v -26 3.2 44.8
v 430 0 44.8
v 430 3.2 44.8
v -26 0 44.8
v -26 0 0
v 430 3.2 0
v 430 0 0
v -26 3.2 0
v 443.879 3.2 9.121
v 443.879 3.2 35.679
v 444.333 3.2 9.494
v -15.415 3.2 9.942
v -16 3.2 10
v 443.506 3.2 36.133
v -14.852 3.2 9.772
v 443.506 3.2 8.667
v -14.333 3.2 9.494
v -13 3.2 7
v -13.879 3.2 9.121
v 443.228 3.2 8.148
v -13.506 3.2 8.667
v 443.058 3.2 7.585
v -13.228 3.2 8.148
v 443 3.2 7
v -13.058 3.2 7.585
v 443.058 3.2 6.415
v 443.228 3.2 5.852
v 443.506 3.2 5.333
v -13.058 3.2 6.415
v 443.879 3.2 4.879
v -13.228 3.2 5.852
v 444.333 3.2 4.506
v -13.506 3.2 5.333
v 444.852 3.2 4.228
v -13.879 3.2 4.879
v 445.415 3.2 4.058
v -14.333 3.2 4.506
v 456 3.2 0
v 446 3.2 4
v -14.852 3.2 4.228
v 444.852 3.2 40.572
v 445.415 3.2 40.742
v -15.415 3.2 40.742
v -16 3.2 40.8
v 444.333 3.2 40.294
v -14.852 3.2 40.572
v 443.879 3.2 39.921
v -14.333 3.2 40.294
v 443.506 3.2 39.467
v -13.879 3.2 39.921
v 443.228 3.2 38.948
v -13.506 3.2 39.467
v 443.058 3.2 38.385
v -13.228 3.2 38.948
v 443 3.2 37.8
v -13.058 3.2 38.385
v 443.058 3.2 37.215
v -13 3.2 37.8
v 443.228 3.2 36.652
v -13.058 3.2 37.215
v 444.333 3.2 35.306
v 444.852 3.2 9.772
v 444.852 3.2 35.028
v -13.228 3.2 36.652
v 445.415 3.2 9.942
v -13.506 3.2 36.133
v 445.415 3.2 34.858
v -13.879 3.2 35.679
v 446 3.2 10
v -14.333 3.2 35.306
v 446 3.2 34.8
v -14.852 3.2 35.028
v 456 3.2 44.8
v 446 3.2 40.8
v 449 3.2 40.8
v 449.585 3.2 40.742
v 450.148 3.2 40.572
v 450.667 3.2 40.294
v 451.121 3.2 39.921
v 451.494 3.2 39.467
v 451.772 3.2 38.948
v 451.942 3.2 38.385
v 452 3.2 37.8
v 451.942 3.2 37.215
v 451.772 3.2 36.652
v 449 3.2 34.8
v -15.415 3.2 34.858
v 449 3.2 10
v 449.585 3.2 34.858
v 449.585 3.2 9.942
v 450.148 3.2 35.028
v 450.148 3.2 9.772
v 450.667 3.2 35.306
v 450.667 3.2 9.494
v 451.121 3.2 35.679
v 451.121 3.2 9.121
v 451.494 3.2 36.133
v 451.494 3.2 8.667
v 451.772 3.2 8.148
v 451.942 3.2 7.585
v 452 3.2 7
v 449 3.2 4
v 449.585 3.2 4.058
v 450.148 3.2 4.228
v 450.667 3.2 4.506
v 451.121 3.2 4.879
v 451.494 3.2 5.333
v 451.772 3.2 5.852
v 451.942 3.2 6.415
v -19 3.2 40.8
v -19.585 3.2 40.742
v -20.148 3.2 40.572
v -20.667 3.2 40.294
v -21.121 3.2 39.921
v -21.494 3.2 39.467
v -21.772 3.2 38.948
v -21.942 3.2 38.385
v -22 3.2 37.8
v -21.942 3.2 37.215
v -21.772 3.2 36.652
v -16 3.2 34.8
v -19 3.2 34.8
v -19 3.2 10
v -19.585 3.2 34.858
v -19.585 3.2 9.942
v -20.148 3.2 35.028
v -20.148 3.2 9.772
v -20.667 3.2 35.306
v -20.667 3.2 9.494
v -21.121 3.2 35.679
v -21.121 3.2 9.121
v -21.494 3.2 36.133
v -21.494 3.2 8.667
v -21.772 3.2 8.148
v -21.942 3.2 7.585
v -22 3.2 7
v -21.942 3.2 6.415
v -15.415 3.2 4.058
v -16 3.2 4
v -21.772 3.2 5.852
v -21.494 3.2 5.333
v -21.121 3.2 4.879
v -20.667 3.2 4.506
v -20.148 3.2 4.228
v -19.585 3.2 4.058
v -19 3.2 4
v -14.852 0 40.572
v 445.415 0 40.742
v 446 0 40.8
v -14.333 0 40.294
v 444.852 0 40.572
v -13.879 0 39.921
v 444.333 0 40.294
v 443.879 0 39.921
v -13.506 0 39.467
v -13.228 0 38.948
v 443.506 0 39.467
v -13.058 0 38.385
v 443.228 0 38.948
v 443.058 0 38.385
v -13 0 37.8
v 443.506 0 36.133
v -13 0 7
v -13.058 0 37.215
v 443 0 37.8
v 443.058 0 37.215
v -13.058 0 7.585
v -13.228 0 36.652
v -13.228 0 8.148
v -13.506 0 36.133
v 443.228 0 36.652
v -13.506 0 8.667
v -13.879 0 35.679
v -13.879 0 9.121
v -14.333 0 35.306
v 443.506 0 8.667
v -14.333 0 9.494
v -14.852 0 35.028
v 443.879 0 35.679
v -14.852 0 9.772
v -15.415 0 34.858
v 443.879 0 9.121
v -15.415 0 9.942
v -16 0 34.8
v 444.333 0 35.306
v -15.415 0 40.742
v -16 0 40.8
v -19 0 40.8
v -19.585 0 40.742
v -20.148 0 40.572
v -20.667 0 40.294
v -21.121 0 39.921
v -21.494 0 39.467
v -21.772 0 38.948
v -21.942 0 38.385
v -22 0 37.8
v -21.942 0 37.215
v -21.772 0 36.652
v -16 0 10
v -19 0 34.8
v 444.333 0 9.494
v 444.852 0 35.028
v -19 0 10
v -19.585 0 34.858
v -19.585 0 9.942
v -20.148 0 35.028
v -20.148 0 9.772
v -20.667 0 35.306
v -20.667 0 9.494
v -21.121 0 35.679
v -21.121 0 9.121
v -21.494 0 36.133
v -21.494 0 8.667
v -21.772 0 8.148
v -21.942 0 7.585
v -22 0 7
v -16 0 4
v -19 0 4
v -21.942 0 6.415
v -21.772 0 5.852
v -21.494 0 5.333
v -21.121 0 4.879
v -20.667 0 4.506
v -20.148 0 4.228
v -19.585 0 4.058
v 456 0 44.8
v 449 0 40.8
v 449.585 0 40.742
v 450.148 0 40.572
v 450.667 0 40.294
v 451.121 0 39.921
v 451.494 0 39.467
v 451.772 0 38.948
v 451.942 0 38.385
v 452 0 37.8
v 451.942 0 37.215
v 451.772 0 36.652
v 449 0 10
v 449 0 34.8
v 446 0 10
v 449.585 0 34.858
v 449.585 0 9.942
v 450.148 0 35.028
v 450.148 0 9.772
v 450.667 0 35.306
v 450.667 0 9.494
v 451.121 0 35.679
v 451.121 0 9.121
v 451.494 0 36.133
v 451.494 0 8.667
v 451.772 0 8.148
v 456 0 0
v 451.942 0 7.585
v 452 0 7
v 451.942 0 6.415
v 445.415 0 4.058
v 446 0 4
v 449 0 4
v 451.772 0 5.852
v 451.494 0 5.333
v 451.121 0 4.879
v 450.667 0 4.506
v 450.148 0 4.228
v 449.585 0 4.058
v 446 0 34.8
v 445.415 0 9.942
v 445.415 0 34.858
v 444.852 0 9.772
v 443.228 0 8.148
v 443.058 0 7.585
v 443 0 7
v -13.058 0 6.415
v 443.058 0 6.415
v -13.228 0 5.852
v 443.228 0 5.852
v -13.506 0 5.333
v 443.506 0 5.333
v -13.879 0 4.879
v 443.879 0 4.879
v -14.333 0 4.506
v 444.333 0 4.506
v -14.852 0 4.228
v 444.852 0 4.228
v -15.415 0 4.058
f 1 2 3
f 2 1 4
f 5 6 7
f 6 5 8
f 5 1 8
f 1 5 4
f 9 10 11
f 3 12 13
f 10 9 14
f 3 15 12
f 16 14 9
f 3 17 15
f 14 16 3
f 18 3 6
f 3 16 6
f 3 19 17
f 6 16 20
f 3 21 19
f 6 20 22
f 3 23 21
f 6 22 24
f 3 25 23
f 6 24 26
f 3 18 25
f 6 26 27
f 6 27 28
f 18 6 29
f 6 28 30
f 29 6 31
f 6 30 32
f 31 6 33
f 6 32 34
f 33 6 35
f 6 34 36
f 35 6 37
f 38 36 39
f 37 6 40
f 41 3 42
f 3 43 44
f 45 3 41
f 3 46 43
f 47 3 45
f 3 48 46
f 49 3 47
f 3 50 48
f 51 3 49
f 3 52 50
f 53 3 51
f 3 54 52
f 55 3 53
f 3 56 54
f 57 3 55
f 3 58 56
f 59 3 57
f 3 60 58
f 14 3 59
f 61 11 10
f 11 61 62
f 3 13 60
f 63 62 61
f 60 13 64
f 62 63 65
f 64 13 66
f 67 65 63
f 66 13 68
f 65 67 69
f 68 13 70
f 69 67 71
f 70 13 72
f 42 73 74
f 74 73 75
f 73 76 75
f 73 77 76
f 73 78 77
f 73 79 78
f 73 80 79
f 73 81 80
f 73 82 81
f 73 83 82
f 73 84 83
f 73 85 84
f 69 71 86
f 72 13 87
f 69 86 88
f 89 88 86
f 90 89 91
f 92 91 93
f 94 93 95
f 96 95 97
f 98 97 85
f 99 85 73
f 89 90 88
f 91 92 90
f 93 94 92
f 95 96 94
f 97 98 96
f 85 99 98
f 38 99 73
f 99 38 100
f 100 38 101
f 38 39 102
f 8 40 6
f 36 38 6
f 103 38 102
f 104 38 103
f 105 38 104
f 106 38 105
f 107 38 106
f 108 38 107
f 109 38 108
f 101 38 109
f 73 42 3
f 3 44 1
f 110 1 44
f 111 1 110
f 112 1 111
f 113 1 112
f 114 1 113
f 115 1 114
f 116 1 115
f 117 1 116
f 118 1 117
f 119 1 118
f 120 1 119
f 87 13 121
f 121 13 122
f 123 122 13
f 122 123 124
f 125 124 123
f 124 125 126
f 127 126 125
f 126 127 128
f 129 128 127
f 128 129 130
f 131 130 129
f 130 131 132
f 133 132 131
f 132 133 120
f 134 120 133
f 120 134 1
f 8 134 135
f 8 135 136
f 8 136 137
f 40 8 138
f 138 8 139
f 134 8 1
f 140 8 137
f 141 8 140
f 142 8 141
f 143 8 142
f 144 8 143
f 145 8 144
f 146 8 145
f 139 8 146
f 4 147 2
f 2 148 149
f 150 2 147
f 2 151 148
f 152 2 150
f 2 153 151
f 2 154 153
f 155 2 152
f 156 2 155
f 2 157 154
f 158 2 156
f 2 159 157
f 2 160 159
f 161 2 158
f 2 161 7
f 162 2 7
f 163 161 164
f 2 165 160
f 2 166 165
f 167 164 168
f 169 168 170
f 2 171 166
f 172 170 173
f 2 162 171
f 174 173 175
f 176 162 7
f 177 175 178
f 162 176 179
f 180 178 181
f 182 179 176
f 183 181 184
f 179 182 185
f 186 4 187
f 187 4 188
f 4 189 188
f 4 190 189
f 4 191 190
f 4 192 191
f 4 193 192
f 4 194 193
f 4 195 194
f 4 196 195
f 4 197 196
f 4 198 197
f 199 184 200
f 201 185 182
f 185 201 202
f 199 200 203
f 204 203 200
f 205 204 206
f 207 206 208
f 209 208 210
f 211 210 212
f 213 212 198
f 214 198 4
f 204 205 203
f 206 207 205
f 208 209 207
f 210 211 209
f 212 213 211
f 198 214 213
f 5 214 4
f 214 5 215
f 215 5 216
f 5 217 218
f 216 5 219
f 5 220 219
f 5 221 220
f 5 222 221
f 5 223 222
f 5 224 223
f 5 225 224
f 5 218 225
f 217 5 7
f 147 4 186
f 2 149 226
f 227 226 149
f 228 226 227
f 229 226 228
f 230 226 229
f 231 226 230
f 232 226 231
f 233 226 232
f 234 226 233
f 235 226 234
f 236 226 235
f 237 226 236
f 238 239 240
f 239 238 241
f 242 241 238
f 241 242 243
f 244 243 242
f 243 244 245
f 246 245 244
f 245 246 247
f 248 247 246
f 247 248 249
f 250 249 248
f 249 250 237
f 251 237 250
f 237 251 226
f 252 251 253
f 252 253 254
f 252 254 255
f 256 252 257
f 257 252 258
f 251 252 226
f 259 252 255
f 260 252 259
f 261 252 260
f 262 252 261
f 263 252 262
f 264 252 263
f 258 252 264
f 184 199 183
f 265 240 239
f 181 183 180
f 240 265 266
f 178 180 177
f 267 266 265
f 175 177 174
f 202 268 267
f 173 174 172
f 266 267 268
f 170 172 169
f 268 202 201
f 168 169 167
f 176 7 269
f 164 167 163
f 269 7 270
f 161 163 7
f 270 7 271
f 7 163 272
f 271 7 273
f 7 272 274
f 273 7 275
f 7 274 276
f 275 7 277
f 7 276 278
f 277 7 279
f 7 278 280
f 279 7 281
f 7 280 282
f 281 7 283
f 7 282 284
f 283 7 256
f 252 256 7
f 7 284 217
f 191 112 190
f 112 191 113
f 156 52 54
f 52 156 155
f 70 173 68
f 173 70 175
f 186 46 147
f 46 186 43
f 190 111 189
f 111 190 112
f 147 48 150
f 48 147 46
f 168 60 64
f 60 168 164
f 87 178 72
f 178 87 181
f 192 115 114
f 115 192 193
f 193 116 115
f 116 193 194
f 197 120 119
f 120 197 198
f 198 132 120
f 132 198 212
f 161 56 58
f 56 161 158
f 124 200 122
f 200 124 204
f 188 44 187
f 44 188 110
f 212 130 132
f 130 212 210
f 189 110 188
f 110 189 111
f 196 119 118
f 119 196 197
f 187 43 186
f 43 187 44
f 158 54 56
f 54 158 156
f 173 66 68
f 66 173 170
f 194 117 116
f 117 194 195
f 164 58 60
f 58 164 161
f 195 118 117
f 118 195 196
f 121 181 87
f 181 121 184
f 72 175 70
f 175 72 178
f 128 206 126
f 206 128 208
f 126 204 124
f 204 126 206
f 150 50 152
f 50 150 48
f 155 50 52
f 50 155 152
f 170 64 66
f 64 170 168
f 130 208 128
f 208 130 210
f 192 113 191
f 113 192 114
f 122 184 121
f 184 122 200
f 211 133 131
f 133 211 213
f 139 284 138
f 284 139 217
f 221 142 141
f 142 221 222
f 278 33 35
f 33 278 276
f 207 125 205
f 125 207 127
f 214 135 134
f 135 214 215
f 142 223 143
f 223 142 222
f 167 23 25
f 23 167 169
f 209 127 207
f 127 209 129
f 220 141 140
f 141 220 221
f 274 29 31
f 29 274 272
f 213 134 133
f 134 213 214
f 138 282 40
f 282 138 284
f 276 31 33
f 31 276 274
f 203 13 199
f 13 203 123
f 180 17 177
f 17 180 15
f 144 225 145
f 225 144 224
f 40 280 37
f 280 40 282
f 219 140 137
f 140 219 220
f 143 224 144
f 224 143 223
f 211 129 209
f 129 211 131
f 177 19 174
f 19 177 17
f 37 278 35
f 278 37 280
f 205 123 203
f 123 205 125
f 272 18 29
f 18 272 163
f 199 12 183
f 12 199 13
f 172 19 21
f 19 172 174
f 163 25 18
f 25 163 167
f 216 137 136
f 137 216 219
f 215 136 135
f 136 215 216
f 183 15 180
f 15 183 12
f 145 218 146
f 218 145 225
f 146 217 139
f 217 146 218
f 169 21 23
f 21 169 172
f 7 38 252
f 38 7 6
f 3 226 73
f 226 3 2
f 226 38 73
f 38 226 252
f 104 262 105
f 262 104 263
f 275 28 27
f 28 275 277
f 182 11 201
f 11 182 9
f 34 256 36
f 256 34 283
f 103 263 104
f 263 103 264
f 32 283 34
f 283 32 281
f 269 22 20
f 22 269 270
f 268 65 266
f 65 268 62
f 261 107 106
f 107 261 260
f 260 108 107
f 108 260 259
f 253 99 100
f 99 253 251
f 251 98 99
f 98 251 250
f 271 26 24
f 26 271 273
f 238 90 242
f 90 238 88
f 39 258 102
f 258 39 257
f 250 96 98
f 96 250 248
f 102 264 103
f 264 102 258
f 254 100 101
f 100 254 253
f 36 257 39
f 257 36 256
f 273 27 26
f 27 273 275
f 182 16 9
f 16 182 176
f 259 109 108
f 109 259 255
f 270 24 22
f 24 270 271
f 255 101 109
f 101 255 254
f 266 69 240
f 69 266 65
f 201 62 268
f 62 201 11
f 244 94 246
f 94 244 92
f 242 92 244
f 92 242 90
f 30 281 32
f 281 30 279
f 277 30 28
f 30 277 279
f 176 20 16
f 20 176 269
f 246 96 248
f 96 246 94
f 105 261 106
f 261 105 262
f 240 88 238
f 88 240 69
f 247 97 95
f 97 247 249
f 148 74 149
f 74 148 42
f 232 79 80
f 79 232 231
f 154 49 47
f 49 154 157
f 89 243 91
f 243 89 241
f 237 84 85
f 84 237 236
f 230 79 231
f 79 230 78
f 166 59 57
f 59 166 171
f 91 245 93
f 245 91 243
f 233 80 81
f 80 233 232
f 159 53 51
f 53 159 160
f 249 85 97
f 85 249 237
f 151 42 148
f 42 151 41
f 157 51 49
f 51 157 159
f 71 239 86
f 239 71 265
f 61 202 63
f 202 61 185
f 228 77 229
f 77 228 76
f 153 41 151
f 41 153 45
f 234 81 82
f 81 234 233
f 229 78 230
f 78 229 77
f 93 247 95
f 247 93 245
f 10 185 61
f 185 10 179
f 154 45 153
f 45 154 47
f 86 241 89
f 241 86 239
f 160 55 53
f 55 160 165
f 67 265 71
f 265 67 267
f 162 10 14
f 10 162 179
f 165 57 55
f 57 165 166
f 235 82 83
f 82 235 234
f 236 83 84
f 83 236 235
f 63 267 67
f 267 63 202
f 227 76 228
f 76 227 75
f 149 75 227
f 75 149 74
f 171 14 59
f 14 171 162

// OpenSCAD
// file: modules/utils.scad
////////////////////////////////////////////////////////////////////////////////////////////////////////////////////////

BUILD_PLATE_X = 256.0;
BUILD_PLATE_Y = 256.0;
BUILD_PLATE_Z = 256.0;

BUILD_PREVIEW_WIDTH = 0.01;

DIFFERENCE_CLEARANCE = 0.01;

////////////////////////////////////////////////////////////////////////////////////////////////////////////////////////
// show a preview of the build plate

module BuildPlatePreview()
{
    % translate([ 0, 0, -BUILD_PREVIEW_WIDTH ])
        cube([ BUILD_PLATE_X, BUILD_PLATE_Y, BUILD_PREVIEW_WIDTH ]);
}

////////////////////////////////////////////////////////////////////////////////////////////////////////////////////////
// list, sum and spacing functions

// sum up the values in the given list
function sumList( list ) = _sumListHelper( list, 0 );
function _sumListHelper( list, n ) = n >= len( list ) ? 0 : list[ n ] + _sumListHelper( list, n + 1 );

// sum up the values in the given list from indicies 0..i (inclusive)
function sumTo( list, i ) = _sumToHelper( list, i, 0 );
function _sumToHelper( list, i, n ) = n >= i || n >= len( list ) ? 0 : list[ n ] + _sumToHelper( list, i, n + 1 );

// adds val_to_add to each index of the given list, returning a new list
function addValueToEachIndex( list, val_to_add ) = [ for( entry = list ) entry + val_to_add ];

// for each size in list, adds up the size and the equally spaces them in the total_size with the given clearance factored in
function calculateEquallySpacedOffset( list, total_size, clearance, i ) =
    let( sizes_with_clearance = addValueToEachIndex( list, clearance * 2 ) )
    let( spacing = ( total_size - sumList( sizes_with_clearance ) ) / ( len( list ) + 1 ) )
    spacing * ( i + 1 ) + sumTo( sizes_with_clearance, i );

// function calculateEquallySpacedOffset( total_size, count, i, item_size ) = ( i + 1 ) / ( count + 1 ) * total_size - item_size / 2;

function calculateOffsetToCenter( total_size, item_size ) = total_size / 2 - item_size / 2;

////////////////////////////////////////////////////////////////////////////////////////////////////////////////////////
// rotate so that we can draw an object from one point to the next

module RotateFromPointAtoB( a, b )
{
    // from: https://en.wikibooks.org/wiki/OpenSCAD_User_Manual/Transformations

    x = b[ 0 ]- a[ 0 ];
    y = b[ 1 ]- a[ 1 ];
    z = b[ 2 ]- a[ 2 ];

    length = norm([ x, y, z ]);
    b = acos( z / length );
    c = atan2( y, x );

    rotate([ 0, b, c ])
        children();
}

////////////////////////////////////////////////////////////////////////////////////////////////////////////////////////
// file: modules/network-rack.scad
////////////////////////////////////////////////////////////////////////////////////////////////////////////////////////

include <utils.scad>

////////////////////////////////////////////////////////////////////////////////////////////////////////////////////////

NETWORK_RACK_FACE_1U_Z = 44.8;
NETWORK_RACK_FACE_INSIDE_X = 430.0;
NETWORK_RACK_FACE_EAR_X = ( 482 - NETWORK_RACK_FACE_INSIDE_X ) / 2;

NETWORK_RACK_FACE_EAR_HOLE_OFFSET_X = 4.0;
NETWORK_RACK_FACE_EAR_HOLE_X = 11.0;

NETWORK_RACK_FACE_EAR_HOLE_OFFSET_Z = 7.0;
NETWORK_RACK_FACE_EAR_HOLE_R = 3.0;

NETWORK_RACK_FACE_FACE_Y = 3.2;

////////////////////////////////////////////////////////////////////////////////////////////////////////////////////////

function NetworkRackFaceWidthU( width_u ) = NETWORK_RACK_FACE_INSIDE_X / 4 * width_u;

function NetworkRackFaceOffsetX( left_ear ) = left_ear ? NETWORK_RACK_FACE_EAR_X : 0;

function NetworkRackFaceY() = NETWORK_RACK_FACE_FACE_Y;

function NetworkRackFaceZ() = NETWORK_RACK_FACE_1U_Z;

////////////////////////////////////////////////////////////////////////////////////////////////////////////////////////

module NetworkRackFace1U( width_quarters, left_ear = false, right_ear = false )
{
    x = NETWORK_RACK_FACE_INSIDE_X / 4 * width_quarters;

    // face
    cube([ x, NETWORK_RACK_FACE_FACE_Y, NETWORK_RACK_FACE_1U_Z ]);

    // left ear
    if( left_ear )
    {
        NetworkRackFaceEar1U();
    }

    // right ear
    if( right_ear )
    {
        translate([ x, 0, NETWORK_RACK_FACE_1U_Z ])
            rotate([ 0, 180, 0 ])
                NetworkRackFaceEar1U();
    }
}

////////////////////////////////////////////////////////////////////////////////////////////////////////////////////////

module NetworkRackFaceEar1U()
{
    ear_hole_top_z = NETWORK_RACK_FACE_1U_Z - NETWORK_RACK_FACE_EAR_HOLE_OFFSET_Z;
    ear_hole_bottom_z = NETWORK_RACK_FACE_EAR_HOLE_OFFSET_Z;

    // TODO: round?
    difference()
    {
        translate([ -NETWORK_RACK_FACE_EAR_X, 0, 0 ])
            cube([ NETWORK_RACK_FACE_EAR_X, NETWORK_RACK_FACE_FACE_Y, NETWORK_RACK_FACE_1U_Z ]);

        // top ear hole
        hull()
        {
            translate([
                -NETWORK_RACK_FACE_EAR_X + NETWORK_RACK_FACE_EAR_HOLE_OFFSET_X + NETWORK_RACK_FACE_EAR_HOLE_R,
                NETWORK_RACK_FACE_FACE_Y + DIFFERENCE_CLEARANCE,
                ear_hole_top_z ])
                rotate([ 90, 0, 0 ])
                    cylinder(
                        r = NETWORK_RACK_FACE_EAR_HOLE_R,
                        h = NETWORK_RACK_FACE_FACE_Y + DIFFERENCE_CLEARANCE * 2,
                        $fn = 32 );
            translate([
                -NETWORK_RACK_FACE_EAR_X + NETWORK_RACK_FACE_EAR_HOLE_X - NETWORK_RACK_FACE_EAR_HOLE_OFFSET_X + NETWORK_RACK_FACE_EAR_HOLE_R,
                NETWORK_RACK_FACE_FACE_Y + DIFFERENCE_CLEARANCE,
                ear_hole_top_z ])
                rotate([ 90, 0, 0 ])
                    cylinder(
                        r = NETWORK_RACK_FACE_EAR_HOLE_R,
                        h = NETWORK_RACK_FACE_FACE_Y + DIFFERENCE_CLEARANCE * 2,
                        $fn = 32 );
        }

        // bottom ear hole
        hull()
        {
            translate([
                -NETWORK_RACK_FACE_EAR_X + NETWORK_RACK_FACE_EAR_HOLE_OFFSET_X + NETWORK_RACK_FACE_EAR_HOLE_R,
                NETWORK_RACK_FACE_FACE_Y + DIFFERENCE_CLEARANCE,
                ear_hole_bottom_z ])
                rotate([ 90, 0, 0 ])
                    cylinder(
                        r = NETWORK_RACK_FACE_EAR_HOLE_R,
                        h = NETWORK_RACK_FACE_FACE_Y + DIFFERENCE_CLEARANCE * 2,
                        $fn = 32 );
            translate([
                -NETWORK_RACK_FACE_EAR_X + NETWORK_RACK_FACE_EAR_HOLE_X - NETWORK_RACK_FACE_EAR_HOLE_OFFSET_X + NETWORK_RACK_FACE_EAR_HOLE_R,
                NETWORK_RACK_FACE_FACE_Y + DIFFERENCE_CLEARANCE,
                ear_hole_bottom_z ])
                rotate([ 90, 0, 0 ])
                    cylinder(
                        r = NETWORK_RACK_FACE_EAR_HOLE_R,
                        h = NETWORK_RACK_FACE_FACE_Y + DIFFERENCE_CLEARANCE * 2,
                        $fn = 32 );
        }
    }
}

////////////////////////////////////////////////////////////////////////////////////////////////////////////////////////
// main file
////////////////////////////////////////////////////////////////////////////////////////////////////////////////////////

include <modules/network-rack.scad>

////////////////////////////////////////////////////////////////////////////////////////////////////////////////////////
// measurements

odroid_n2plus_x = 91.0;
odroid_n2plus_y = 100.0;
odroid_n2plus_z = 28.0;

////////////////////////////////////////////////////////////////////////////////////////////////////////////////////////
// settings

render_mode = "preview";
// render_mode = "print";

left_ear = true;
right_ear = true;

////////////////////////////////////////////////////////////////////////////////////////////////////////////////////////
// calculations

////////////////////////////////////////////////////////////////////////////////////////////////////////////////////////
// models

if( render_mode == "preview" )
{
    // % cube([ 430, 150, 44.8 ]);

    NetworkRackFace1U( 4, left_ear, right_ear );

    // BuildPlatePreview();
}
else if( render_mode == "print" )
{
    translate([ NetworkRackFaceOffsetX( left_ear ), NetworkRackFaceOffsetZ(), 0 ])
        rotate([ 90, 0, 0 ])
            NetworkRackFace1U( 4, left_ear, right_ear );
}
else
{
    assert( false, str( "unknown render_mode: ", render_mode ) );
}

////////////////////////////////////////////////////////////////////////////////////////////////////////////////////////

////////////////////////////////////////////////////////////////////////////////////////////////////////////////////////
